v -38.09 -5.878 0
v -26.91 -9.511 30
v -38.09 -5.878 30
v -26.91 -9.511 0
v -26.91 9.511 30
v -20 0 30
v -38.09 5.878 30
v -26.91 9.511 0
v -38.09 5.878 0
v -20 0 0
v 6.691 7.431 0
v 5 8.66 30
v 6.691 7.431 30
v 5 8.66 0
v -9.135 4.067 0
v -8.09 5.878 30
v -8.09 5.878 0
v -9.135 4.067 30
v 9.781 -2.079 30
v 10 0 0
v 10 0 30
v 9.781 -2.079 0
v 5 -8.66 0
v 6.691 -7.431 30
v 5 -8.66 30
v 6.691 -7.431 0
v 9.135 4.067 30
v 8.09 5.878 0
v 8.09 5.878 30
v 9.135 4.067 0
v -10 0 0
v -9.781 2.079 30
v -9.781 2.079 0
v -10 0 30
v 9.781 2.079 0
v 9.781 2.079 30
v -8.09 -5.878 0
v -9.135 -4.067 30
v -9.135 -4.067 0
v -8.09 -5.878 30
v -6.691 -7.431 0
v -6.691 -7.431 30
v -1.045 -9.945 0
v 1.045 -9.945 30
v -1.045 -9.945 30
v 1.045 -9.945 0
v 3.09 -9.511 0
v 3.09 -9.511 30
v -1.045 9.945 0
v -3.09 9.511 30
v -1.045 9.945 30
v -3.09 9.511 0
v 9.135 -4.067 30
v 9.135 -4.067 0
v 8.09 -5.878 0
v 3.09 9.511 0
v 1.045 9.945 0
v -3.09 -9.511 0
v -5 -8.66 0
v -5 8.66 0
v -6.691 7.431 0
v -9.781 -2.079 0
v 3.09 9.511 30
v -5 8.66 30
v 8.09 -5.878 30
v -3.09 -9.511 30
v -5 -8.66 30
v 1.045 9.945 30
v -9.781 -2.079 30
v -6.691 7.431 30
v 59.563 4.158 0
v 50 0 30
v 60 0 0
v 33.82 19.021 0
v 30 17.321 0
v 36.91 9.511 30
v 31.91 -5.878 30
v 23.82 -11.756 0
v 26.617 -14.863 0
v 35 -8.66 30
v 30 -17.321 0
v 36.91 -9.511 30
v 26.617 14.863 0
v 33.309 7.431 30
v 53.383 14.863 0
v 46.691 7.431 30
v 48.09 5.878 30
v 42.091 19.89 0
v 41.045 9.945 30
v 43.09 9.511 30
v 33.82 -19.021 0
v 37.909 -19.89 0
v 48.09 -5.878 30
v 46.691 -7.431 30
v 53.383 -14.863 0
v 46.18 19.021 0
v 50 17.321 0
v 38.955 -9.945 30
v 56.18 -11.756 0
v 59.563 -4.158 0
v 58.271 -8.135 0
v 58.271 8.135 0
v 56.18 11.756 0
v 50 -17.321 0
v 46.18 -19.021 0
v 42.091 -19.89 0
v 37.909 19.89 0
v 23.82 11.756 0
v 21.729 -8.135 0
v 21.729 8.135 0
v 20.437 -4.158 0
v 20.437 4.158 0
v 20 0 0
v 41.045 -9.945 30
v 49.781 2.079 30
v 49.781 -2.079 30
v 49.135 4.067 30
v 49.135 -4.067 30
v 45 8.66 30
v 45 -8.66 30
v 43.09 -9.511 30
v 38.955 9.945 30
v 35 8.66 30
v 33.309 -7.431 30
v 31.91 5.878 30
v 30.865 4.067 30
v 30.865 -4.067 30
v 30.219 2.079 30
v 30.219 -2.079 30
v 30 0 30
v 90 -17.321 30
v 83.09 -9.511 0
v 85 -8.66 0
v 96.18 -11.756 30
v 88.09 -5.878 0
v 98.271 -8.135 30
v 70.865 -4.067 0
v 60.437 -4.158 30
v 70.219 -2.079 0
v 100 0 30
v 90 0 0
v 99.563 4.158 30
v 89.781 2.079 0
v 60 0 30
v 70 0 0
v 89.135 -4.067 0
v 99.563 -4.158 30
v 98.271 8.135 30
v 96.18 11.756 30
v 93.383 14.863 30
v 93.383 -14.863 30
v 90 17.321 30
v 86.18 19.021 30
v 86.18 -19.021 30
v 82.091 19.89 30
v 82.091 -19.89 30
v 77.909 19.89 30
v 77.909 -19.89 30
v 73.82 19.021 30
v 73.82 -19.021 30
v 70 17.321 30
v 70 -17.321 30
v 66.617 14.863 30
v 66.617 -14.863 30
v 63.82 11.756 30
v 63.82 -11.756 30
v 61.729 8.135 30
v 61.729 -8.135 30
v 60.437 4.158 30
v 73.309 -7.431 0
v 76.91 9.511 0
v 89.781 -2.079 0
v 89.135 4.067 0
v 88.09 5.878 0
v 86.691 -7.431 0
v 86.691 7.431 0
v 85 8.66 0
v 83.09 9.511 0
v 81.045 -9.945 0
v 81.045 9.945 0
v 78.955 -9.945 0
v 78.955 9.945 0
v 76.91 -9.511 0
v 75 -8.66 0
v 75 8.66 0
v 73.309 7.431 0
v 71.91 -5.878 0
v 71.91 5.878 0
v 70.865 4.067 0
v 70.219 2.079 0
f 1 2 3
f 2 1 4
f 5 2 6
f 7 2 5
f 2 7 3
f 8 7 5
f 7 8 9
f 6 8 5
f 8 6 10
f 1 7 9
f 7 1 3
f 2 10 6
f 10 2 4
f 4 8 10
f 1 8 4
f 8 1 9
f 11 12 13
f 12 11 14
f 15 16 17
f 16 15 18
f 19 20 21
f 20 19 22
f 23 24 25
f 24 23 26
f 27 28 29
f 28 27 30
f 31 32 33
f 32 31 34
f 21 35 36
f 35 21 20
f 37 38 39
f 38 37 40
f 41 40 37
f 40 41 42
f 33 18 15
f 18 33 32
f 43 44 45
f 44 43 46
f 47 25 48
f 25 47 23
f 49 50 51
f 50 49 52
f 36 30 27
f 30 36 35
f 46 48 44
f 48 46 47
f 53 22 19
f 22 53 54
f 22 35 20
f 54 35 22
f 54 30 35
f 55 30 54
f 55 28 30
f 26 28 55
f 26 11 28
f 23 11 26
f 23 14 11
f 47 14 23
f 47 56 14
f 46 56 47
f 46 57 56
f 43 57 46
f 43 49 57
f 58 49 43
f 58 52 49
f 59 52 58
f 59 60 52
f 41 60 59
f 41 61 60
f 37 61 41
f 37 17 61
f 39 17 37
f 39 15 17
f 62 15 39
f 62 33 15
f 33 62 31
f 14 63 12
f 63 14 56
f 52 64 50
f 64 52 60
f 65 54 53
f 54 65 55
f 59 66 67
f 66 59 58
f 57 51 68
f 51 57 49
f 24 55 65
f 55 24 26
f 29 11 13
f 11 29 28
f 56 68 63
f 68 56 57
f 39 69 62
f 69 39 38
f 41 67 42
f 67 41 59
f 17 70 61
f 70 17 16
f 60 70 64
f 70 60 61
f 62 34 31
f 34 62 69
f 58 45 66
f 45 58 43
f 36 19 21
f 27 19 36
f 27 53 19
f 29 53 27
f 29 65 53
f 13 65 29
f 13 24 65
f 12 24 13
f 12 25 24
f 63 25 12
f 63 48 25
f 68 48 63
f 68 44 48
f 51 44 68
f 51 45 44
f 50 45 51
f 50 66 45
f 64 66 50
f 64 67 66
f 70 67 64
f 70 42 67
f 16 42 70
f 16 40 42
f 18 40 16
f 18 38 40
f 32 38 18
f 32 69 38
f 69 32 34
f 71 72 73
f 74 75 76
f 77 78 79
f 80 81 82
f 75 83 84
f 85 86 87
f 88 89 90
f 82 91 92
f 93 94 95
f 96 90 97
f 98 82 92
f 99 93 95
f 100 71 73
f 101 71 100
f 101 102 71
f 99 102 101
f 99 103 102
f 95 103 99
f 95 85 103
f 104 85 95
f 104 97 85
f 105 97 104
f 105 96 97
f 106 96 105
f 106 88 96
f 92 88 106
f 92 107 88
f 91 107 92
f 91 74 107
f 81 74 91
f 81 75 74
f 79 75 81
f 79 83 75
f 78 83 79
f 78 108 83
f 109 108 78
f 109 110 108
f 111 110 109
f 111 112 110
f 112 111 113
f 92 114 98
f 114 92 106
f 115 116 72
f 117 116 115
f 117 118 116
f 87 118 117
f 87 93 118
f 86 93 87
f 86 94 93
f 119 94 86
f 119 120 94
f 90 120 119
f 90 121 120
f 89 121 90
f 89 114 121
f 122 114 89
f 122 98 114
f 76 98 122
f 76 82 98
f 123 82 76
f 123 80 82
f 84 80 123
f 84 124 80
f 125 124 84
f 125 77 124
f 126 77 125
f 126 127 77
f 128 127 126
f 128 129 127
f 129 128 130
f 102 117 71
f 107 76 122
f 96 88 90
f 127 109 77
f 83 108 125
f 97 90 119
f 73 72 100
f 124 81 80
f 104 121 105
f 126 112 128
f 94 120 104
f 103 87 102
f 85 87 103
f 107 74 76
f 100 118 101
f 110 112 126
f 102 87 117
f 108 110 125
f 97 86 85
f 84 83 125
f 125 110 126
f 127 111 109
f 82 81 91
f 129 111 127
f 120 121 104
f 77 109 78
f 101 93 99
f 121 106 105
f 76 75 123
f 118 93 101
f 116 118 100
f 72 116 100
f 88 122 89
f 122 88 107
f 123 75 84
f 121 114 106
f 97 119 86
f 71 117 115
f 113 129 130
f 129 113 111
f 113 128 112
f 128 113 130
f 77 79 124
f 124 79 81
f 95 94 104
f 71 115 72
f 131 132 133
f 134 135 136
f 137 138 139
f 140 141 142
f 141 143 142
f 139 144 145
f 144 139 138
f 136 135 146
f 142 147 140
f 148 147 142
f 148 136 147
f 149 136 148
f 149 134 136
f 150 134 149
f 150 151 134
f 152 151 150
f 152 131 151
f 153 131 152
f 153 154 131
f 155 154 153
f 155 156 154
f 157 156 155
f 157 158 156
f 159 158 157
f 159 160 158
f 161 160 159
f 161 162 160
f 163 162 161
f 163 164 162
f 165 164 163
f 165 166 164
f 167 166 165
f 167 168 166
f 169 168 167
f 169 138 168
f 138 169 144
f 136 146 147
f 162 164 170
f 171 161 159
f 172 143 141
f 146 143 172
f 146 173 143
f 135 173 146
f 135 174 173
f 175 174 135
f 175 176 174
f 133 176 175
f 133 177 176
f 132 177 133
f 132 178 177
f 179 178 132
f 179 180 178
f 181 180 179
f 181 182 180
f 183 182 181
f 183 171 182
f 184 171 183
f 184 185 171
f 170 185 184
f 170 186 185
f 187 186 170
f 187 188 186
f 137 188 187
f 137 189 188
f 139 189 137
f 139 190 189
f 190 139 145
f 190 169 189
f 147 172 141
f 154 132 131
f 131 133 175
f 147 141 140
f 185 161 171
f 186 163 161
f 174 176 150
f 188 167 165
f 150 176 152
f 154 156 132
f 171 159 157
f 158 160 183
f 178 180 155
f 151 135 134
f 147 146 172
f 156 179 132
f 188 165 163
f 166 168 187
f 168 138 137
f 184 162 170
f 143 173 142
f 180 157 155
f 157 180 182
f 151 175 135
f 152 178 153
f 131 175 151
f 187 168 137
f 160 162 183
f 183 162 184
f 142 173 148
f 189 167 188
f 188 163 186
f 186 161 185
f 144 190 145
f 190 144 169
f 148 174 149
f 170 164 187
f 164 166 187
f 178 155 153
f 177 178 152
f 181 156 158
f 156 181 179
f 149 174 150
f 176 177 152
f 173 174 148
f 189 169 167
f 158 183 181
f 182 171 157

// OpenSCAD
 translate([-30, 0, 0])
 cylinder(h = 30, r1 = 10, r2 = 10, $fn = 5, center = false);
 
 cylinder(h = 30, r1 = 10, r2 = 10, center = false);
 
 translate([40, 0, 0])
 cylinder(h = 30, r1 = 20, r2 = 10, center = false);
 
 translate([80, 0, 0])
 cylinder(h = 30, r1 = 10, r2 = 20, center = false);
 
 
